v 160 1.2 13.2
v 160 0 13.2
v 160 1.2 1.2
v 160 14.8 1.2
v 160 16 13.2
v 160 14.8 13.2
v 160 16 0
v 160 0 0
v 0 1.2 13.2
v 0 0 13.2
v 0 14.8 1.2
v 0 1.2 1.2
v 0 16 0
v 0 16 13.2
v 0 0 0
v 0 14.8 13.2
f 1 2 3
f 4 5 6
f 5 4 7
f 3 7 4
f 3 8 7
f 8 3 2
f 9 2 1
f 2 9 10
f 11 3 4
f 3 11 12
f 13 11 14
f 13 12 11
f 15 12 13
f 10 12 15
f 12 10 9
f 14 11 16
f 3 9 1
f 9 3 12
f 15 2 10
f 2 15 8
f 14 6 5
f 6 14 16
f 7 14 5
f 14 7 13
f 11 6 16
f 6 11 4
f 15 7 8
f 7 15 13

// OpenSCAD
// ScienceClaw nominal U-channel. All dimensions in millimeters.
// Clamp the first clamp_length along x. No holes or clamp reinforcement.
// Print parameters, layer orientation, material batch, and actual dimensions
// must be recorded separately; this file does not prescribe a qualified process.
length = 160;
clamp_length = 25;
base_width = 16;
wall_height = 12;
thickness = 1.2;
assert(length > clamp_length && clamp_length > 0);
assert(base_width > 2 * thickness && thickness > 0 && wall_height >= 0);
union() {
    cube([length, base_width, thickness]);
    if (wall_height > 0) {
        translate([0, 0, thickness]) cube([length, thickness, wall_height]);
        translate([0, base_width - thickness, thickness]) cube([length, thickness, wall_height]);
    }
}
